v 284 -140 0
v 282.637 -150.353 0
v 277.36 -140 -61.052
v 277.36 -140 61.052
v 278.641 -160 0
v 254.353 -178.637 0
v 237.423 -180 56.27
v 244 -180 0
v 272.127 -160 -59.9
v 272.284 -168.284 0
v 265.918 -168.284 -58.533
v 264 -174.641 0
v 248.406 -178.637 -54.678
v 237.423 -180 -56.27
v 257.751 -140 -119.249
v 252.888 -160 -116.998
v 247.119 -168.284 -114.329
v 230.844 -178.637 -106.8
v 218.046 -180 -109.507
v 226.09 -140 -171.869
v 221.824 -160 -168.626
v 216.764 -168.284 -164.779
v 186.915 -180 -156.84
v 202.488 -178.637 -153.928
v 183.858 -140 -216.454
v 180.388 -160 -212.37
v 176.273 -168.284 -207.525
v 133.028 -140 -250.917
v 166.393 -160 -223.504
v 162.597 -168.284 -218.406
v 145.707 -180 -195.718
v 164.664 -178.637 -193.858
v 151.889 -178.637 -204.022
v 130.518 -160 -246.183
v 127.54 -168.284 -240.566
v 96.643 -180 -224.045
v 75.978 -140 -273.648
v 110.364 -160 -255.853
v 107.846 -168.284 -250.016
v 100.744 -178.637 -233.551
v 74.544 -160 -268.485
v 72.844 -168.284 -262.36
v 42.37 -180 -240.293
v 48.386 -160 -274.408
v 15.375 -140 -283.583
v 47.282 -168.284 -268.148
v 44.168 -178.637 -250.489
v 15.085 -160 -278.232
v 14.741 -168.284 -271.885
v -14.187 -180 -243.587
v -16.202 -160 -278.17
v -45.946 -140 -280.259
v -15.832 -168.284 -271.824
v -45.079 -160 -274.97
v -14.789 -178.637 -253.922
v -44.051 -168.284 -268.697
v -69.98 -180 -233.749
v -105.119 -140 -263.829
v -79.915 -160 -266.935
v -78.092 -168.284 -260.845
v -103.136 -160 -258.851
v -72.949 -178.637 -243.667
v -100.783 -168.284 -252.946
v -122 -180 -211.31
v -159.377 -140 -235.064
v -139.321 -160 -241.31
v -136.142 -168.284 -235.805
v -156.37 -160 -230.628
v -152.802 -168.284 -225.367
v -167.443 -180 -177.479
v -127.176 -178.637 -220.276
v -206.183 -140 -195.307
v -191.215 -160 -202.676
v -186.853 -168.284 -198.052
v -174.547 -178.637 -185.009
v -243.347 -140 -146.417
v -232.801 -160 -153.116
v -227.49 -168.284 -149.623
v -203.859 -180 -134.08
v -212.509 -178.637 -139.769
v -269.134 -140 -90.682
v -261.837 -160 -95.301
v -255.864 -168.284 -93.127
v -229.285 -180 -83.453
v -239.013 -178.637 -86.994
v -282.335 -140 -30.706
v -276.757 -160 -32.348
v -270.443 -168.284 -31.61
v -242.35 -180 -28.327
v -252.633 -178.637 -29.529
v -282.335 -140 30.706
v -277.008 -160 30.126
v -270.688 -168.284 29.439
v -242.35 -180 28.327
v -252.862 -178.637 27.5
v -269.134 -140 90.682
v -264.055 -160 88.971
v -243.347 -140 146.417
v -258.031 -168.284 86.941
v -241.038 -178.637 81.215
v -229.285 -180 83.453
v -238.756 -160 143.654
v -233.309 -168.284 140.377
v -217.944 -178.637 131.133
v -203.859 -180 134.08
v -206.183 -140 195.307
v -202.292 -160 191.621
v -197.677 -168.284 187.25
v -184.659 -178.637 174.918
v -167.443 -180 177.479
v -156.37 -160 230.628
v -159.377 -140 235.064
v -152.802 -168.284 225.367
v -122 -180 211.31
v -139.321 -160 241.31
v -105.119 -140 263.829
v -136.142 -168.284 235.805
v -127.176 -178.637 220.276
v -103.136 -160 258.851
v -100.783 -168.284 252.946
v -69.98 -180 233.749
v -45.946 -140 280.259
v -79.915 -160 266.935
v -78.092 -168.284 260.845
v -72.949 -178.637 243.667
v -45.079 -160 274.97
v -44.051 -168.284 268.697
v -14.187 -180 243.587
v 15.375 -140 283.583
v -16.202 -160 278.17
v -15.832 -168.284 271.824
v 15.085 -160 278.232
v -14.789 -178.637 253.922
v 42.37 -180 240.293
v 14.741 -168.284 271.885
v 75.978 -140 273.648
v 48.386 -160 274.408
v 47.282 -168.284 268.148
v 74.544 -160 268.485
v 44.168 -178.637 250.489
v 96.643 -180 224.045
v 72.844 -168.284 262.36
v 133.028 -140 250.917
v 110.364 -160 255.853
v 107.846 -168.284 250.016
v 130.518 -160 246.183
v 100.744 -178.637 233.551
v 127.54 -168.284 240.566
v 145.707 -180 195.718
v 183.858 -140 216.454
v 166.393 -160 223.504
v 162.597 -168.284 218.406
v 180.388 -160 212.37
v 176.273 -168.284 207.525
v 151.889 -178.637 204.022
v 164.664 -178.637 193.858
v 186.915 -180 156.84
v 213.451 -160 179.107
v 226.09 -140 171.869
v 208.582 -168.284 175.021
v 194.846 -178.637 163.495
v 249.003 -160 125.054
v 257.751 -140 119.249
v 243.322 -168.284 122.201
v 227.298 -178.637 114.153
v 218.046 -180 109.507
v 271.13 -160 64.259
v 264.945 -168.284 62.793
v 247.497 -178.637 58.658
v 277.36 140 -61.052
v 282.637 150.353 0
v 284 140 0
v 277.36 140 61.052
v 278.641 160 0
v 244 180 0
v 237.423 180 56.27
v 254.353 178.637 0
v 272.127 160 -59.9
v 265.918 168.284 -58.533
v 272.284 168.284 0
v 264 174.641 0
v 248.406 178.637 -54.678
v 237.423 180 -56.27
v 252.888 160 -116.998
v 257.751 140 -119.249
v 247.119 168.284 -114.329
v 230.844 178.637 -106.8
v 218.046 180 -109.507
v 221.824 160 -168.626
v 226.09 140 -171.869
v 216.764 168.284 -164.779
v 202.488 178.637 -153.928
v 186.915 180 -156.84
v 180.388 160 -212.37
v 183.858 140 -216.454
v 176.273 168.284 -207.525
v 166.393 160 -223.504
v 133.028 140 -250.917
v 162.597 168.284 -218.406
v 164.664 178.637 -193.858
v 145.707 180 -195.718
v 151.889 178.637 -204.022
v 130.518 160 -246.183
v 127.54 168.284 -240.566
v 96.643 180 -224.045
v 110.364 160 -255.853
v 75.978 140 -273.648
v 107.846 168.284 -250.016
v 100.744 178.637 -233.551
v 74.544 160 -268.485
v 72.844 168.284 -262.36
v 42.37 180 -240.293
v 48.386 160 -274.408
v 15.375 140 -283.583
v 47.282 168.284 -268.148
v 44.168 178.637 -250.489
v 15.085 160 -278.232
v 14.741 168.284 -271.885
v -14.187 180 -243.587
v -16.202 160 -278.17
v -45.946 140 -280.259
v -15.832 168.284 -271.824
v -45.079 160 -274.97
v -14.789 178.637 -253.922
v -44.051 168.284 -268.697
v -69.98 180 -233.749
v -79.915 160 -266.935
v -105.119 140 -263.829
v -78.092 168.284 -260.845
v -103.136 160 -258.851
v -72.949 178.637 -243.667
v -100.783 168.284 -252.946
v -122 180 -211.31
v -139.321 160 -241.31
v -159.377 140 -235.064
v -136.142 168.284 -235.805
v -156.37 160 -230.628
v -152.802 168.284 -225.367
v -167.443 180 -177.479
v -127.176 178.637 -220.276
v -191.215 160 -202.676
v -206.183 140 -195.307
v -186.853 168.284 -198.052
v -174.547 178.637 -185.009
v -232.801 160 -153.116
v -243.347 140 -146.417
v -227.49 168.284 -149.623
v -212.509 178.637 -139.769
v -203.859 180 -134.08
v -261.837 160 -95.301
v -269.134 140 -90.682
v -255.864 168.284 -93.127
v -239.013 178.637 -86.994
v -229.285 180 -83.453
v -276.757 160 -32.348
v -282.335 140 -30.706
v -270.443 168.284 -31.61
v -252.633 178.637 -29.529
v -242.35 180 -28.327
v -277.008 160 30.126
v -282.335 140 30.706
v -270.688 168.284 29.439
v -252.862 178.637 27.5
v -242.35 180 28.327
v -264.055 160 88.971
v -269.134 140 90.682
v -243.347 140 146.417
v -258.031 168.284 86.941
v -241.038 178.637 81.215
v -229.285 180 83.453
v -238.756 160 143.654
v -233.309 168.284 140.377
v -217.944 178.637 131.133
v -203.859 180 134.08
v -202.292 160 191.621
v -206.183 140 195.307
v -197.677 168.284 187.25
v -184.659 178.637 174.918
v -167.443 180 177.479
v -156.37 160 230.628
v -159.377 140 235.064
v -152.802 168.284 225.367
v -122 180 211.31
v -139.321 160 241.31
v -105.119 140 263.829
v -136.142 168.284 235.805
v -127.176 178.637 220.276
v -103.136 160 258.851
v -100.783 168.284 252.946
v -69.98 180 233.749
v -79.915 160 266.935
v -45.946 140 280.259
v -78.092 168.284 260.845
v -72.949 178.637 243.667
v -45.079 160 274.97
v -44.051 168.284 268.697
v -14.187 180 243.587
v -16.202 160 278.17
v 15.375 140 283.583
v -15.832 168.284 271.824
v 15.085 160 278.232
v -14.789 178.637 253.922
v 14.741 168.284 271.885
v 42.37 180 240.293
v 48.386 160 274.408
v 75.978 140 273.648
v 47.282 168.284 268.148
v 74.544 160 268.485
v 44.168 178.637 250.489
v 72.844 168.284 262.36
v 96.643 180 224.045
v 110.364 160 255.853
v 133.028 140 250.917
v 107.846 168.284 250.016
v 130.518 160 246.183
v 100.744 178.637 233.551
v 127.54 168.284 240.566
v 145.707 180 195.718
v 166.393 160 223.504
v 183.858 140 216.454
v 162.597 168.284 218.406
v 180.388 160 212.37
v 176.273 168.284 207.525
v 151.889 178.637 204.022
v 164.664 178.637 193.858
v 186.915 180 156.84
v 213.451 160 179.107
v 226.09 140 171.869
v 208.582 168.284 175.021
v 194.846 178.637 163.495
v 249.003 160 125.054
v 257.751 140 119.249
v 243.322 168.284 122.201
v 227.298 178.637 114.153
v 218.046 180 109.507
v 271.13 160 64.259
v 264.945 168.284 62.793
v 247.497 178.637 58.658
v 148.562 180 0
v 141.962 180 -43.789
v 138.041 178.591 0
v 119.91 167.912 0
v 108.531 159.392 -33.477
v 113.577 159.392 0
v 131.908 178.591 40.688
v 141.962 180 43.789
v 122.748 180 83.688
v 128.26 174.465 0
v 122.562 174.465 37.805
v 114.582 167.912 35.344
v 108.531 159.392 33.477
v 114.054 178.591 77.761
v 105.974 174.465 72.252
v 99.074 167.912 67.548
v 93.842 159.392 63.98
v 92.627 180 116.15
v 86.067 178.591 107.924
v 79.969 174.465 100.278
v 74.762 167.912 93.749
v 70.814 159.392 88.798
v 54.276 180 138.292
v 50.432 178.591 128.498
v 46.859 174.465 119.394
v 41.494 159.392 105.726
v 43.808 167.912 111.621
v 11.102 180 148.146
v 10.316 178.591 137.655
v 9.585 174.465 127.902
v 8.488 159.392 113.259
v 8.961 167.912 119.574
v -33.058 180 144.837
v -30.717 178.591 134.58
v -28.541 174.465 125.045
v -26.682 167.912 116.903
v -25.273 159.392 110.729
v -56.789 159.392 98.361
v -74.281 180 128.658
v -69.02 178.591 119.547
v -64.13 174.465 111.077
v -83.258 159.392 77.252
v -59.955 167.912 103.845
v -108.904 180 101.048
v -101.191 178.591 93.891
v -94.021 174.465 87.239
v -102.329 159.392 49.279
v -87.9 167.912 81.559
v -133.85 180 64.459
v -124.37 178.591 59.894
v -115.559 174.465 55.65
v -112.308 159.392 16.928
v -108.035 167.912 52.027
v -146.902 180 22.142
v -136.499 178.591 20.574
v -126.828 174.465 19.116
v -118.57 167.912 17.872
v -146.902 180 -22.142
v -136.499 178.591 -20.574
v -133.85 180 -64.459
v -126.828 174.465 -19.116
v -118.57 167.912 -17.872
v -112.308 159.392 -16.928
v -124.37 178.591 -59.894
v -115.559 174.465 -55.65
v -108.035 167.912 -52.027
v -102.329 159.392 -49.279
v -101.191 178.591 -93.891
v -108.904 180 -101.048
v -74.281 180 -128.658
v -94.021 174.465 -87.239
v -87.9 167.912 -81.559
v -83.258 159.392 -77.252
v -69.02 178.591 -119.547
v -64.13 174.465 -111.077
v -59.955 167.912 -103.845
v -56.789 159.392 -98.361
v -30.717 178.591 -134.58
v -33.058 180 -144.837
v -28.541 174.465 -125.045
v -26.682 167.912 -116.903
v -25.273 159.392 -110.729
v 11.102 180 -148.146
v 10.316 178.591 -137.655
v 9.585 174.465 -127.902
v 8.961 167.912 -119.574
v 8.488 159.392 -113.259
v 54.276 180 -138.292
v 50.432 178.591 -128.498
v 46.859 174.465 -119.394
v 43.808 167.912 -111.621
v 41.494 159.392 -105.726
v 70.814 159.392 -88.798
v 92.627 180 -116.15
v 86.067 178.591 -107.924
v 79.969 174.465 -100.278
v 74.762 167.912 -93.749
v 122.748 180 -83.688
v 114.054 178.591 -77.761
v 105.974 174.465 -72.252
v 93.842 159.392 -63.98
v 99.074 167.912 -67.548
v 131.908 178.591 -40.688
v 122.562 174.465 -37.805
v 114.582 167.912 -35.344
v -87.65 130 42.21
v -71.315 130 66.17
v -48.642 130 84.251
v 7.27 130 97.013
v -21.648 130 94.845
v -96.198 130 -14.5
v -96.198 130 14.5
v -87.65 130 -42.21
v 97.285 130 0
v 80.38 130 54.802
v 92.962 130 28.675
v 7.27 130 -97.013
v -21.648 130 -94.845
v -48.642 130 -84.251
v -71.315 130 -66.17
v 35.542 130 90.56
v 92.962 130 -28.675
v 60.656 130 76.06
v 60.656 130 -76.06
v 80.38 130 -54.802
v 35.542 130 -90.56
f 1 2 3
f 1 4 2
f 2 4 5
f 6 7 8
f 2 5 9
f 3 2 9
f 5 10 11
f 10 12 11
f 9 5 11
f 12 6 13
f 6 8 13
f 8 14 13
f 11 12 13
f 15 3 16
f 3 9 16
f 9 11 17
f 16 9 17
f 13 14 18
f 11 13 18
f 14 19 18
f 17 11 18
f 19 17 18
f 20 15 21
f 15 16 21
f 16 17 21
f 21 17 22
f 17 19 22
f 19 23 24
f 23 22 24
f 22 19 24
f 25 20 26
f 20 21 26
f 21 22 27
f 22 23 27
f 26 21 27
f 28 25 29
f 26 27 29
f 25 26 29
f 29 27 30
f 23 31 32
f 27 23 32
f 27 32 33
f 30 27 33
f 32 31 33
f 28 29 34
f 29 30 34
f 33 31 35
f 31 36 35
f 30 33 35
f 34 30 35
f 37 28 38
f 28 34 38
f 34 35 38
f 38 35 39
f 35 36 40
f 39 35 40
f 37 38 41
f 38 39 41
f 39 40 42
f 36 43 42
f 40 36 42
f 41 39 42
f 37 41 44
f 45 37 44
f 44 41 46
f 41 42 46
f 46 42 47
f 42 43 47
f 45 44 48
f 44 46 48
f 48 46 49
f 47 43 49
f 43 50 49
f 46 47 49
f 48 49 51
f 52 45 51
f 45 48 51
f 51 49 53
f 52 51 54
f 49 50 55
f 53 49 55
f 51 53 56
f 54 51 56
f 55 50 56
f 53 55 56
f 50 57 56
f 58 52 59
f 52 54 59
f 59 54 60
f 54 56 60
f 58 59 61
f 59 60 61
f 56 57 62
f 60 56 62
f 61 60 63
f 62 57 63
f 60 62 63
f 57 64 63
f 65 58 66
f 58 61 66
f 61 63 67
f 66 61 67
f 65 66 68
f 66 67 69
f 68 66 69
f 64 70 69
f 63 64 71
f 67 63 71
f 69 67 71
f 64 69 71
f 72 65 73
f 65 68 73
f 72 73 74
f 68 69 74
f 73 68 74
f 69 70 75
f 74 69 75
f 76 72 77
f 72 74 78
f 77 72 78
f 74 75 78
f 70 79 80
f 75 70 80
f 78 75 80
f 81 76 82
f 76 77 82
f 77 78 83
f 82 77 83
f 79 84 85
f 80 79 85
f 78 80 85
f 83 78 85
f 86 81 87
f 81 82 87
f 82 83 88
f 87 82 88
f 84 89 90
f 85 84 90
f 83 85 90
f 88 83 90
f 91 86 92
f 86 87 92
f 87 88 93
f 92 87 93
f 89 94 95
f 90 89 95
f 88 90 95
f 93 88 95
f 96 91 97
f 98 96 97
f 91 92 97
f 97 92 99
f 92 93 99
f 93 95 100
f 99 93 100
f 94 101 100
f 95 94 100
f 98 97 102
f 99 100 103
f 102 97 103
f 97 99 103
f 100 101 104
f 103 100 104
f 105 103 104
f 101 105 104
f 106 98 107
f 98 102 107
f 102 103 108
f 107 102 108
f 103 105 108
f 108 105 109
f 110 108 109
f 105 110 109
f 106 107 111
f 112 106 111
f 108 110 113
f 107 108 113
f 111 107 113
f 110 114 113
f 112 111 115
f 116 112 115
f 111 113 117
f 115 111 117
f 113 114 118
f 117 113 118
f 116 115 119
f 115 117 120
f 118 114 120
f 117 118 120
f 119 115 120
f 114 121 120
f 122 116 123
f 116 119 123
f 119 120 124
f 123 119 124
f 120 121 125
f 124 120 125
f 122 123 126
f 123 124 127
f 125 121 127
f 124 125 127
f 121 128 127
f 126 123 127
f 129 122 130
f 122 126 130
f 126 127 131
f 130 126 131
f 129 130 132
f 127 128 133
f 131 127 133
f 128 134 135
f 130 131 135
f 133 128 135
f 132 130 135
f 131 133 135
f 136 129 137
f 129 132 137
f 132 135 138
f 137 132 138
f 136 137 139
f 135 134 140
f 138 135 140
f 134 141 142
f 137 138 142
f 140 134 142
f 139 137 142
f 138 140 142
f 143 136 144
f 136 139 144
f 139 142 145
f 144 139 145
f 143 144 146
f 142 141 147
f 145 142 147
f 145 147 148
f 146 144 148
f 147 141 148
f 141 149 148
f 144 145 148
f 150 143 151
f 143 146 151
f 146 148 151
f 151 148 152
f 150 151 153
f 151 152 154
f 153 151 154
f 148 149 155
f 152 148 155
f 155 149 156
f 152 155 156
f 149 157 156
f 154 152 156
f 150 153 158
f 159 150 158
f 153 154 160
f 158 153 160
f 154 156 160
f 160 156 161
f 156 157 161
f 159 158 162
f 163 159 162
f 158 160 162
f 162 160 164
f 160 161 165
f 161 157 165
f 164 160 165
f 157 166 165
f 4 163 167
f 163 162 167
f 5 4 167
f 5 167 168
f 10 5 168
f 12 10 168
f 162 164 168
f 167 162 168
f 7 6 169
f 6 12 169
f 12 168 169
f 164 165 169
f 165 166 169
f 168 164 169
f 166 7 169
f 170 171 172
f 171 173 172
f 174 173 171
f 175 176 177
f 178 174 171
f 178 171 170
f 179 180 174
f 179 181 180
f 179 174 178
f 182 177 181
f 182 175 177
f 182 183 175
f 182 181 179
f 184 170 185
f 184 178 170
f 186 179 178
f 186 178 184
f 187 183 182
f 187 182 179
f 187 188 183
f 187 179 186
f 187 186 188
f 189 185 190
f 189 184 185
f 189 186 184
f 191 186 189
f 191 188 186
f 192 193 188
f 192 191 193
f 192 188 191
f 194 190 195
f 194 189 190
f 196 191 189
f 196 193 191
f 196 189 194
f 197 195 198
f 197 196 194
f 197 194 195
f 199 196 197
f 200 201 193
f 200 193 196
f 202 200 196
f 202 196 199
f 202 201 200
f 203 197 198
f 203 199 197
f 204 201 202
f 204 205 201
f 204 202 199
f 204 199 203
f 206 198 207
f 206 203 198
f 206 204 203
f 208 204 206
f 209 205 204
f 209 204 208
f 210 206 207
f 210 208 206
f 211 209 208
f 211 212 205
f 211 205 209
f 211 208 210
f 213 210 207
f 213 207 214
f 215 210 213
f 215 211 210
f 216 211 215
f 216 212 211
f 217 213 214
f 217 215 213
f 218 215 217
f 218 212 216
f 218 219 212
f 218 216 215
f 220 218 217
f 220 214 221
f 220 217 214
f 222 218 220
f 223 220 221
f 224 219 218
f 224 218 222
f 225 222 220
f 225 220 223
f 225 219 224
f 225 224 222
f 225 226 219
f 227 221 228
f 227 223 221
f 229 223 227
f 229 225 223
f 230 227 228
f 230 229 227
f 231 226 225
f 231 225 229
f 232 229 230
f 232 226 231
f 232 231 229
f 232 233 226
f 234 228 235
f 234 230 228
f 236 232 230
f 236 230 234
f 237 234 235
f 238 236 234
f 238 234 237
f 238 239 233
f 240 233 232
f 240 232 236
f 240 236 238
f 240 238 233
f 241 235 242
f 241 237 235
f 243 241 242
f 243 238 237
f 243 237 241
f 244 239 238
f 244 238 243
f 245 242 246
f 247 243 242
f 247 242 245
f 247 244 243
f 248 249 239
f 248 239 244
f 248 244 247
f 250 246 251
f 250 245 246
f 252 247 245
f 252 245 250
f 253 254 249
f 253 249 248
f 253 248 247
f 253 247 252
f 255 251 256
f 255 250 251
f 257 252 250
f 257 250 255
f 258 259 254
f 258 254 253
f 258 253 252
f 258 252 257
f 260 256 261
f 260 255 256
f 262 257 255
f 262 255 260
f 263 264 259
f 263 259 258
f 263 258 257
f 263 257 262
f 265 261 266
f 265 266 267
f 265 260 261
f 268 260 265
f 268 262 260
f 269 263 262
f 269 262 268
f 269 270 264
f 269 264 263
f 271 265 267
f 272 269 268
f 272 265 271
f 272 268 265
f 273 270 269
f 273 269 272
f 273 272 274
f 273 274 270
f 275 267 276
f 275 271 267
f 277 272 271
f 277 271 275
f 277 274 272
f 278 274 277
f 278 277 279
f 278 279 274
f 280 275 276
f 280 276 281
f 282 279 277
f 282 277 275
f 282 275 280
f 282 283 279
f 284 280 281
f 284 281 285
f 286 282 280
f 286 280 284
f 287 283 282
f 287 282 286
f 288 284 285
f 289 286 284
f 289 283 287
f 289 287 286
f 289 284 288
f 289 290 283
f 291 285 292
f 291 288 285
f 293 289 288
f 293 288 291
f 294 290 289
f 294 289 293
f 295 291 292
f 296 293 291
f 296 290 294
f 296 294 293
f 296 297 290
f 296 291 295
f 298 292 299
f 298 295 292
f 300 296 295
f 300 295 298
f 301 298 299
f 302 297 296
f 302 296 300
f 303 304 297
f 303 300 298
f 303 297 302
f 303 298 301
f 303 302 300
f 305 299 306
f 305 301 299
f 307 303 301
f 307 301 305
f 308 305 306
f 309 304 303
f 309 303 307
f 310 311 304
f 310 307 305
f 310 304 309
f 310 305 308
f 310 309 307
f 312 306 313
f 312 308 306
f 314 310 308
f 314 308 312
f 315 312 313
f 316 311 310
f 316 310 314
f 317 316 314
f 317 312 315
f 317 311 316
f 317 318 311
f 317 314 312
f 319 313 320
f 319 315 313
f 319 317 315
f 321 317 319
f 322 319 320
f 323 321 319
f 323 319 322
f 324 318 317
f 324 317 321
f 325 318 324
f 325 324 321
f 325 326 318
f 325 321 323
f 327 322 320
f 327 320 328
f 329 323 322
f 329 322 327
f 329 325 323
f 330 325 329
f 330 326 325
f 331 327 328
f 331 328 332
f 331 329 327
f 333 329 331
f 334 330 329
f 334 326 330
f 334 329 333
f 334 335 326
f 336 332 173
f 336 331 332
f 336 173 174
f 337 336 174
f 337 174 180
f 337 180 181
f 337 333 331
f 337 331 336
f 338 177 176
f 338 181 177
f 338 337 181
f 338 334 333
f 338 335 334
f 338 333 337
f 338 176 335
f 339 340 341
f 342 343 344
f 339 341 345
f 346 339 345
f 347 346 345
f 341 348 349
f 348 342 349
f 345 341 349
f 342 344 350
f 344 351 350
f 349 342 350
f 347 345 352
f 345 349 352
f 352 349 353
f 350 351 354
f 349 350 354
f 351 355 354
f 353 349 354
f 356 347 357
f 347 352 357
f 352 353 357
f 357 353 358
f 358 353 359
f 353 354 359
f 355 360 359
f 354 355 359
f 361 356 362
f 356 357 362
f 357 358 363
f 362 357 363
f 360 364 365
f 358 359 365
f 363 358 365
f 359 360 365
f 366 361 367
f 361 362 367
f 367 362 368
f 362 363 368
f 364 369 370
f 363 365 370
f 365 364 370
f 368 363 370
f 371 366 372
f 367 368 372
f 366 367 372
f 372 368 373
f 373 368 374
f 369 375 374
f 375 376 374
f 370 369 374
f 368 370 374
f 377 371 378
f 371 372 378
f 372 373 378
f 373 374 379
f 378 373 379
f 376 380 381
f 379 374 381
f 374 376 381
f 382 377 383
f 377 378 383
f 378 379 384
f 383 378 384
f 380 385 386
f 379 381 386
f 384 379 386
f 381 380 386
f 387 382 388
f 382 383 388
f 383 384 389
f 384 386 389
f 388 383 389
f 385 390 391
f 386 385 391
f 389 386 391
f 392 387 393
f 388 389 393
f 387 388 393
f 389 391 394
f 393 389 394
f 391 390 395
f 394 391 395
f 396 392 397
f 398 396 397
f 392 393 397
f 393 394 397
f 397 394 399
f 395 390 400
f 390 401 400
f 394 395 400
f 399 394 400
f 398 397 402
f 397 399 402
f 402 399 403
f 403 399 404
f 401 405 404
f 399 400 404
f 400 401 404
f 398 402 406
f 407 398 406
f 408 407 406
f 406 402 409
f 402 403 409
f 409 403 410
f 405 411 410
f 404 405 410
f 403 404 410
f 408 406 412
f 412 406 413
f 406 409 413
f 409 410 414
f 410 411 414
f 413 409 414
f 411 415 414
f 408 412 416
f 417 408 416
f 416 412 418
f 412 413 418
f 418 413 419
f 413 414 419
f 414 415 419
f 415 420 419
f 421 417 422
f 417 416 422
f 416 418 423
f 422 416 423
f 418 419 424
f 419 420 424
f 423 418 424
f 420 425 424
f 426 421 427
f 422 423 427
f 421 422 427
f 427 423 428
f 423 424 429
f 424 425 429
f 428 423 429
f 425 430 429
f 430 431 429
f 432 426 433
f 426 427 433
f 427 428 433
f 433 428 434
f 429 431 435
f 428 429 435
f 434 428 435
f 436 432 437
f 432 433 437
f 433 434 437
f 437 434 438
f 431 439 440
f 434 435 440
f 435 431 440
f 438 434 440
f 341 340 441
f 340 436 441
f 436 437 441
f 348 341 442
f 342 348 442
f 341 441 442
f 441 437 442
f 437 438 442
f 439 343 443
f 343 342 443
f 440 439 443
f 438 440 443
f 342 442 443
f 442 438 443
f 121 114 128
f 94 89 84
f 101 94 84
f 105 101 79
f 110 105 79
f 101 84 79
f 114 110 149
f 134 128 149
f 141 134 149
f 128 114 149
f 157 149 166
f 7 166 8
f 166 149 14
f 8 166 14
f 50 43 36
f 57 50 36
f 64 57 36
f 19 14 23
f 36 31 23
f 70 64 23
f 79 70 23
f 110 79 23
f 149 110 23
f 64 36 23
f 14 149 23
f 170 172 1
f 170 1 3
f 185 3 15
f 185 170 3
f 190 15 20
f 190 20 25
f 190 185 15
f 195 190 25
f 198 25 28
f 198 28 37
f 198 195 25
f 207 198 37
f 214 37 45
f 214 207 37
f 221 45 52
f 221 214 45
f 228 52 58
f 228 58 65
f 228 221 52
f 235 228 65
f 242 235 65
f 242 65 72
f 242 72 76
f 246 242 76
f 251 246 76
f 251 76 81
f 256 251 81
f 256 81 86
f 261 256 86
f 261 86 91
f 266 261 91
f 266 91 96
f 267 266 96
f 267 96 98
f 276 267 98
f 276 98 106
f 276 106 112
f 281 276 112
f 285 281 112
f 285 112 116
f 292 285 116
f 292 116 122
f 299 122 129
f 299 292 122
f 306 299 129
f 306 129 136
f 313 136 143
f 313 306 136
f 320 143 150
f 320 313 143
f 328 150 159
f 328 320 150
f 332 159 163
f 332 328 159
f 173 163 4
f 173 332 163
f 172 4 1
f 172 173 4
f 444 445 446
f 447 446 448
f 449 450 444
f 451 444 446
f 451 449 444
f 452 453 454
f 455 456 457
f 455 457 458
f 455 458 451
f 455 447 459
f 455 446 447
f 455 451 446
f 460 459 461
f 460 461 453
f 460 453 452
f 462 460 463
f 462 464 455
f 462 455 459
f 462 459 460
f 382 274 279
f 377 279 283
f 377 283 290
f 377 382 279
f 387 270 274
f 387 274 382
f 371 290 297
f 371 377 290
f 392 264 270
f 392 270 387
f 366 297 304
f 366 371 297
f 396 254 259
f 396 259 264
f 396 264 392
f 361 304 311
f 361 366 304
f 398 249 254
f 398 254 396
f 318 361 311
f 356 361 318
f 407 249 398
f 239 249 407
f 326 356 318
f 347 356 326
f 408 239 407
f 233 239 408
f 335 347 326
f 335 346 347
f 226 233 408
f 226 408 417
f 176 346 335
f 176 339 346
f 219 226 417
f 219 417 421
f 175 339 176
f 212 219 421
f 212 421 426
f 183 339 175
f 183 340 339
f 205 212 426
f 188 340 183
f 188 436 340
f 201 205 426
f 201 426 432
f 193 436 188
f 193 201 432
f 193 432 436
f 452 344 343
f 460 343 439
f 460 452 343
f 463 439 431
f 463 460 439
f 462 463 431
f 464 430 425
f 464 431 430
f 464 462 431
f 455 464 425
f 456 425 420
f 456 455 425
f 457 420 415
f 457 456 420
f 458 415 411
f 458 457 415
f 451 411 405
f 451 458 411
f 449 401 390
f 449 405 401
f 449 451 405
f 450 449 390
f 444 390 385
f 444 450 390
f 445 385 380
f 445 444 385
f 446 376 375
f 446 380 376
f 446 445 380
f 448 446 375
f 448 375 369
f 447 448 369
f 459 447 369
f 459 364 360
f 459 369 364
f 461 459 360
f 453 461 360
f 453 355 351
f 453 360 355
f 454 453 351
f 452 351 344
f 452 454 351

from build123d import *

# Parameters (mm, degrees)
SKETCH1_R           = 284
BOSS_EXTRUDE1_DEPTH = 180
SKETCH2_R           = 125
CUT_EXTRUDE1_DEPTH  = 50
CUT_EXTRUDE1_TAPER  = 29
FILLET1_R           = 40
FILLET2_R           = 40
FILLET3_R           = 40


with BuildPart() as part:
    # Sketch1 → Boss-Extrude1 (new body, symmetric)
    with BuildSketch(Plane(origin=(0, 0, 0), x_dir=(1, 0, 0), z_dir=(0, 1, 0))):
        Circle(SKETCH1_R)
    extrude(amount=BOSS_EXTRUDE1_DEPTH, both=True)

    # Sketch2 → Cut-Extrude1 (cut)
    with BuildSketch(Plane(origin=(0, 180, 0), x_dir=(1, 0, 0), z_dir=(0, 1, 0))):
        Circle(SKETCH2_R)
    extrude(amount=-CUT_EXTRUDE1_DEPTH, taper=CUT_EXTRUDE1_TAPER, mode=Mode.SUBTRACT)

    # Fillet1
    fillet1_edges = [part.edges().sort_by_distance(p)[0] for p in [
        (-284, 180, 0),
    ]]
    fillet(fillet1_edges, radius=FILLET1_R)

    # Fillet2
    fillet2_edges = [part.edges().sort_by_distance(p)[0] for p in [
        (-125, 180, 0),
    ]]
    fillet(fillet2_edges, radius=FILLET2_R)

    # Fillet3
    fillet3_edges = [part.edges().sort_by_distance(p)[0] for p in [
        (-284, -180, 0),
    ]]
    fillet(fillet3_edges, radius=FILLET3_R)


solid = part.part
